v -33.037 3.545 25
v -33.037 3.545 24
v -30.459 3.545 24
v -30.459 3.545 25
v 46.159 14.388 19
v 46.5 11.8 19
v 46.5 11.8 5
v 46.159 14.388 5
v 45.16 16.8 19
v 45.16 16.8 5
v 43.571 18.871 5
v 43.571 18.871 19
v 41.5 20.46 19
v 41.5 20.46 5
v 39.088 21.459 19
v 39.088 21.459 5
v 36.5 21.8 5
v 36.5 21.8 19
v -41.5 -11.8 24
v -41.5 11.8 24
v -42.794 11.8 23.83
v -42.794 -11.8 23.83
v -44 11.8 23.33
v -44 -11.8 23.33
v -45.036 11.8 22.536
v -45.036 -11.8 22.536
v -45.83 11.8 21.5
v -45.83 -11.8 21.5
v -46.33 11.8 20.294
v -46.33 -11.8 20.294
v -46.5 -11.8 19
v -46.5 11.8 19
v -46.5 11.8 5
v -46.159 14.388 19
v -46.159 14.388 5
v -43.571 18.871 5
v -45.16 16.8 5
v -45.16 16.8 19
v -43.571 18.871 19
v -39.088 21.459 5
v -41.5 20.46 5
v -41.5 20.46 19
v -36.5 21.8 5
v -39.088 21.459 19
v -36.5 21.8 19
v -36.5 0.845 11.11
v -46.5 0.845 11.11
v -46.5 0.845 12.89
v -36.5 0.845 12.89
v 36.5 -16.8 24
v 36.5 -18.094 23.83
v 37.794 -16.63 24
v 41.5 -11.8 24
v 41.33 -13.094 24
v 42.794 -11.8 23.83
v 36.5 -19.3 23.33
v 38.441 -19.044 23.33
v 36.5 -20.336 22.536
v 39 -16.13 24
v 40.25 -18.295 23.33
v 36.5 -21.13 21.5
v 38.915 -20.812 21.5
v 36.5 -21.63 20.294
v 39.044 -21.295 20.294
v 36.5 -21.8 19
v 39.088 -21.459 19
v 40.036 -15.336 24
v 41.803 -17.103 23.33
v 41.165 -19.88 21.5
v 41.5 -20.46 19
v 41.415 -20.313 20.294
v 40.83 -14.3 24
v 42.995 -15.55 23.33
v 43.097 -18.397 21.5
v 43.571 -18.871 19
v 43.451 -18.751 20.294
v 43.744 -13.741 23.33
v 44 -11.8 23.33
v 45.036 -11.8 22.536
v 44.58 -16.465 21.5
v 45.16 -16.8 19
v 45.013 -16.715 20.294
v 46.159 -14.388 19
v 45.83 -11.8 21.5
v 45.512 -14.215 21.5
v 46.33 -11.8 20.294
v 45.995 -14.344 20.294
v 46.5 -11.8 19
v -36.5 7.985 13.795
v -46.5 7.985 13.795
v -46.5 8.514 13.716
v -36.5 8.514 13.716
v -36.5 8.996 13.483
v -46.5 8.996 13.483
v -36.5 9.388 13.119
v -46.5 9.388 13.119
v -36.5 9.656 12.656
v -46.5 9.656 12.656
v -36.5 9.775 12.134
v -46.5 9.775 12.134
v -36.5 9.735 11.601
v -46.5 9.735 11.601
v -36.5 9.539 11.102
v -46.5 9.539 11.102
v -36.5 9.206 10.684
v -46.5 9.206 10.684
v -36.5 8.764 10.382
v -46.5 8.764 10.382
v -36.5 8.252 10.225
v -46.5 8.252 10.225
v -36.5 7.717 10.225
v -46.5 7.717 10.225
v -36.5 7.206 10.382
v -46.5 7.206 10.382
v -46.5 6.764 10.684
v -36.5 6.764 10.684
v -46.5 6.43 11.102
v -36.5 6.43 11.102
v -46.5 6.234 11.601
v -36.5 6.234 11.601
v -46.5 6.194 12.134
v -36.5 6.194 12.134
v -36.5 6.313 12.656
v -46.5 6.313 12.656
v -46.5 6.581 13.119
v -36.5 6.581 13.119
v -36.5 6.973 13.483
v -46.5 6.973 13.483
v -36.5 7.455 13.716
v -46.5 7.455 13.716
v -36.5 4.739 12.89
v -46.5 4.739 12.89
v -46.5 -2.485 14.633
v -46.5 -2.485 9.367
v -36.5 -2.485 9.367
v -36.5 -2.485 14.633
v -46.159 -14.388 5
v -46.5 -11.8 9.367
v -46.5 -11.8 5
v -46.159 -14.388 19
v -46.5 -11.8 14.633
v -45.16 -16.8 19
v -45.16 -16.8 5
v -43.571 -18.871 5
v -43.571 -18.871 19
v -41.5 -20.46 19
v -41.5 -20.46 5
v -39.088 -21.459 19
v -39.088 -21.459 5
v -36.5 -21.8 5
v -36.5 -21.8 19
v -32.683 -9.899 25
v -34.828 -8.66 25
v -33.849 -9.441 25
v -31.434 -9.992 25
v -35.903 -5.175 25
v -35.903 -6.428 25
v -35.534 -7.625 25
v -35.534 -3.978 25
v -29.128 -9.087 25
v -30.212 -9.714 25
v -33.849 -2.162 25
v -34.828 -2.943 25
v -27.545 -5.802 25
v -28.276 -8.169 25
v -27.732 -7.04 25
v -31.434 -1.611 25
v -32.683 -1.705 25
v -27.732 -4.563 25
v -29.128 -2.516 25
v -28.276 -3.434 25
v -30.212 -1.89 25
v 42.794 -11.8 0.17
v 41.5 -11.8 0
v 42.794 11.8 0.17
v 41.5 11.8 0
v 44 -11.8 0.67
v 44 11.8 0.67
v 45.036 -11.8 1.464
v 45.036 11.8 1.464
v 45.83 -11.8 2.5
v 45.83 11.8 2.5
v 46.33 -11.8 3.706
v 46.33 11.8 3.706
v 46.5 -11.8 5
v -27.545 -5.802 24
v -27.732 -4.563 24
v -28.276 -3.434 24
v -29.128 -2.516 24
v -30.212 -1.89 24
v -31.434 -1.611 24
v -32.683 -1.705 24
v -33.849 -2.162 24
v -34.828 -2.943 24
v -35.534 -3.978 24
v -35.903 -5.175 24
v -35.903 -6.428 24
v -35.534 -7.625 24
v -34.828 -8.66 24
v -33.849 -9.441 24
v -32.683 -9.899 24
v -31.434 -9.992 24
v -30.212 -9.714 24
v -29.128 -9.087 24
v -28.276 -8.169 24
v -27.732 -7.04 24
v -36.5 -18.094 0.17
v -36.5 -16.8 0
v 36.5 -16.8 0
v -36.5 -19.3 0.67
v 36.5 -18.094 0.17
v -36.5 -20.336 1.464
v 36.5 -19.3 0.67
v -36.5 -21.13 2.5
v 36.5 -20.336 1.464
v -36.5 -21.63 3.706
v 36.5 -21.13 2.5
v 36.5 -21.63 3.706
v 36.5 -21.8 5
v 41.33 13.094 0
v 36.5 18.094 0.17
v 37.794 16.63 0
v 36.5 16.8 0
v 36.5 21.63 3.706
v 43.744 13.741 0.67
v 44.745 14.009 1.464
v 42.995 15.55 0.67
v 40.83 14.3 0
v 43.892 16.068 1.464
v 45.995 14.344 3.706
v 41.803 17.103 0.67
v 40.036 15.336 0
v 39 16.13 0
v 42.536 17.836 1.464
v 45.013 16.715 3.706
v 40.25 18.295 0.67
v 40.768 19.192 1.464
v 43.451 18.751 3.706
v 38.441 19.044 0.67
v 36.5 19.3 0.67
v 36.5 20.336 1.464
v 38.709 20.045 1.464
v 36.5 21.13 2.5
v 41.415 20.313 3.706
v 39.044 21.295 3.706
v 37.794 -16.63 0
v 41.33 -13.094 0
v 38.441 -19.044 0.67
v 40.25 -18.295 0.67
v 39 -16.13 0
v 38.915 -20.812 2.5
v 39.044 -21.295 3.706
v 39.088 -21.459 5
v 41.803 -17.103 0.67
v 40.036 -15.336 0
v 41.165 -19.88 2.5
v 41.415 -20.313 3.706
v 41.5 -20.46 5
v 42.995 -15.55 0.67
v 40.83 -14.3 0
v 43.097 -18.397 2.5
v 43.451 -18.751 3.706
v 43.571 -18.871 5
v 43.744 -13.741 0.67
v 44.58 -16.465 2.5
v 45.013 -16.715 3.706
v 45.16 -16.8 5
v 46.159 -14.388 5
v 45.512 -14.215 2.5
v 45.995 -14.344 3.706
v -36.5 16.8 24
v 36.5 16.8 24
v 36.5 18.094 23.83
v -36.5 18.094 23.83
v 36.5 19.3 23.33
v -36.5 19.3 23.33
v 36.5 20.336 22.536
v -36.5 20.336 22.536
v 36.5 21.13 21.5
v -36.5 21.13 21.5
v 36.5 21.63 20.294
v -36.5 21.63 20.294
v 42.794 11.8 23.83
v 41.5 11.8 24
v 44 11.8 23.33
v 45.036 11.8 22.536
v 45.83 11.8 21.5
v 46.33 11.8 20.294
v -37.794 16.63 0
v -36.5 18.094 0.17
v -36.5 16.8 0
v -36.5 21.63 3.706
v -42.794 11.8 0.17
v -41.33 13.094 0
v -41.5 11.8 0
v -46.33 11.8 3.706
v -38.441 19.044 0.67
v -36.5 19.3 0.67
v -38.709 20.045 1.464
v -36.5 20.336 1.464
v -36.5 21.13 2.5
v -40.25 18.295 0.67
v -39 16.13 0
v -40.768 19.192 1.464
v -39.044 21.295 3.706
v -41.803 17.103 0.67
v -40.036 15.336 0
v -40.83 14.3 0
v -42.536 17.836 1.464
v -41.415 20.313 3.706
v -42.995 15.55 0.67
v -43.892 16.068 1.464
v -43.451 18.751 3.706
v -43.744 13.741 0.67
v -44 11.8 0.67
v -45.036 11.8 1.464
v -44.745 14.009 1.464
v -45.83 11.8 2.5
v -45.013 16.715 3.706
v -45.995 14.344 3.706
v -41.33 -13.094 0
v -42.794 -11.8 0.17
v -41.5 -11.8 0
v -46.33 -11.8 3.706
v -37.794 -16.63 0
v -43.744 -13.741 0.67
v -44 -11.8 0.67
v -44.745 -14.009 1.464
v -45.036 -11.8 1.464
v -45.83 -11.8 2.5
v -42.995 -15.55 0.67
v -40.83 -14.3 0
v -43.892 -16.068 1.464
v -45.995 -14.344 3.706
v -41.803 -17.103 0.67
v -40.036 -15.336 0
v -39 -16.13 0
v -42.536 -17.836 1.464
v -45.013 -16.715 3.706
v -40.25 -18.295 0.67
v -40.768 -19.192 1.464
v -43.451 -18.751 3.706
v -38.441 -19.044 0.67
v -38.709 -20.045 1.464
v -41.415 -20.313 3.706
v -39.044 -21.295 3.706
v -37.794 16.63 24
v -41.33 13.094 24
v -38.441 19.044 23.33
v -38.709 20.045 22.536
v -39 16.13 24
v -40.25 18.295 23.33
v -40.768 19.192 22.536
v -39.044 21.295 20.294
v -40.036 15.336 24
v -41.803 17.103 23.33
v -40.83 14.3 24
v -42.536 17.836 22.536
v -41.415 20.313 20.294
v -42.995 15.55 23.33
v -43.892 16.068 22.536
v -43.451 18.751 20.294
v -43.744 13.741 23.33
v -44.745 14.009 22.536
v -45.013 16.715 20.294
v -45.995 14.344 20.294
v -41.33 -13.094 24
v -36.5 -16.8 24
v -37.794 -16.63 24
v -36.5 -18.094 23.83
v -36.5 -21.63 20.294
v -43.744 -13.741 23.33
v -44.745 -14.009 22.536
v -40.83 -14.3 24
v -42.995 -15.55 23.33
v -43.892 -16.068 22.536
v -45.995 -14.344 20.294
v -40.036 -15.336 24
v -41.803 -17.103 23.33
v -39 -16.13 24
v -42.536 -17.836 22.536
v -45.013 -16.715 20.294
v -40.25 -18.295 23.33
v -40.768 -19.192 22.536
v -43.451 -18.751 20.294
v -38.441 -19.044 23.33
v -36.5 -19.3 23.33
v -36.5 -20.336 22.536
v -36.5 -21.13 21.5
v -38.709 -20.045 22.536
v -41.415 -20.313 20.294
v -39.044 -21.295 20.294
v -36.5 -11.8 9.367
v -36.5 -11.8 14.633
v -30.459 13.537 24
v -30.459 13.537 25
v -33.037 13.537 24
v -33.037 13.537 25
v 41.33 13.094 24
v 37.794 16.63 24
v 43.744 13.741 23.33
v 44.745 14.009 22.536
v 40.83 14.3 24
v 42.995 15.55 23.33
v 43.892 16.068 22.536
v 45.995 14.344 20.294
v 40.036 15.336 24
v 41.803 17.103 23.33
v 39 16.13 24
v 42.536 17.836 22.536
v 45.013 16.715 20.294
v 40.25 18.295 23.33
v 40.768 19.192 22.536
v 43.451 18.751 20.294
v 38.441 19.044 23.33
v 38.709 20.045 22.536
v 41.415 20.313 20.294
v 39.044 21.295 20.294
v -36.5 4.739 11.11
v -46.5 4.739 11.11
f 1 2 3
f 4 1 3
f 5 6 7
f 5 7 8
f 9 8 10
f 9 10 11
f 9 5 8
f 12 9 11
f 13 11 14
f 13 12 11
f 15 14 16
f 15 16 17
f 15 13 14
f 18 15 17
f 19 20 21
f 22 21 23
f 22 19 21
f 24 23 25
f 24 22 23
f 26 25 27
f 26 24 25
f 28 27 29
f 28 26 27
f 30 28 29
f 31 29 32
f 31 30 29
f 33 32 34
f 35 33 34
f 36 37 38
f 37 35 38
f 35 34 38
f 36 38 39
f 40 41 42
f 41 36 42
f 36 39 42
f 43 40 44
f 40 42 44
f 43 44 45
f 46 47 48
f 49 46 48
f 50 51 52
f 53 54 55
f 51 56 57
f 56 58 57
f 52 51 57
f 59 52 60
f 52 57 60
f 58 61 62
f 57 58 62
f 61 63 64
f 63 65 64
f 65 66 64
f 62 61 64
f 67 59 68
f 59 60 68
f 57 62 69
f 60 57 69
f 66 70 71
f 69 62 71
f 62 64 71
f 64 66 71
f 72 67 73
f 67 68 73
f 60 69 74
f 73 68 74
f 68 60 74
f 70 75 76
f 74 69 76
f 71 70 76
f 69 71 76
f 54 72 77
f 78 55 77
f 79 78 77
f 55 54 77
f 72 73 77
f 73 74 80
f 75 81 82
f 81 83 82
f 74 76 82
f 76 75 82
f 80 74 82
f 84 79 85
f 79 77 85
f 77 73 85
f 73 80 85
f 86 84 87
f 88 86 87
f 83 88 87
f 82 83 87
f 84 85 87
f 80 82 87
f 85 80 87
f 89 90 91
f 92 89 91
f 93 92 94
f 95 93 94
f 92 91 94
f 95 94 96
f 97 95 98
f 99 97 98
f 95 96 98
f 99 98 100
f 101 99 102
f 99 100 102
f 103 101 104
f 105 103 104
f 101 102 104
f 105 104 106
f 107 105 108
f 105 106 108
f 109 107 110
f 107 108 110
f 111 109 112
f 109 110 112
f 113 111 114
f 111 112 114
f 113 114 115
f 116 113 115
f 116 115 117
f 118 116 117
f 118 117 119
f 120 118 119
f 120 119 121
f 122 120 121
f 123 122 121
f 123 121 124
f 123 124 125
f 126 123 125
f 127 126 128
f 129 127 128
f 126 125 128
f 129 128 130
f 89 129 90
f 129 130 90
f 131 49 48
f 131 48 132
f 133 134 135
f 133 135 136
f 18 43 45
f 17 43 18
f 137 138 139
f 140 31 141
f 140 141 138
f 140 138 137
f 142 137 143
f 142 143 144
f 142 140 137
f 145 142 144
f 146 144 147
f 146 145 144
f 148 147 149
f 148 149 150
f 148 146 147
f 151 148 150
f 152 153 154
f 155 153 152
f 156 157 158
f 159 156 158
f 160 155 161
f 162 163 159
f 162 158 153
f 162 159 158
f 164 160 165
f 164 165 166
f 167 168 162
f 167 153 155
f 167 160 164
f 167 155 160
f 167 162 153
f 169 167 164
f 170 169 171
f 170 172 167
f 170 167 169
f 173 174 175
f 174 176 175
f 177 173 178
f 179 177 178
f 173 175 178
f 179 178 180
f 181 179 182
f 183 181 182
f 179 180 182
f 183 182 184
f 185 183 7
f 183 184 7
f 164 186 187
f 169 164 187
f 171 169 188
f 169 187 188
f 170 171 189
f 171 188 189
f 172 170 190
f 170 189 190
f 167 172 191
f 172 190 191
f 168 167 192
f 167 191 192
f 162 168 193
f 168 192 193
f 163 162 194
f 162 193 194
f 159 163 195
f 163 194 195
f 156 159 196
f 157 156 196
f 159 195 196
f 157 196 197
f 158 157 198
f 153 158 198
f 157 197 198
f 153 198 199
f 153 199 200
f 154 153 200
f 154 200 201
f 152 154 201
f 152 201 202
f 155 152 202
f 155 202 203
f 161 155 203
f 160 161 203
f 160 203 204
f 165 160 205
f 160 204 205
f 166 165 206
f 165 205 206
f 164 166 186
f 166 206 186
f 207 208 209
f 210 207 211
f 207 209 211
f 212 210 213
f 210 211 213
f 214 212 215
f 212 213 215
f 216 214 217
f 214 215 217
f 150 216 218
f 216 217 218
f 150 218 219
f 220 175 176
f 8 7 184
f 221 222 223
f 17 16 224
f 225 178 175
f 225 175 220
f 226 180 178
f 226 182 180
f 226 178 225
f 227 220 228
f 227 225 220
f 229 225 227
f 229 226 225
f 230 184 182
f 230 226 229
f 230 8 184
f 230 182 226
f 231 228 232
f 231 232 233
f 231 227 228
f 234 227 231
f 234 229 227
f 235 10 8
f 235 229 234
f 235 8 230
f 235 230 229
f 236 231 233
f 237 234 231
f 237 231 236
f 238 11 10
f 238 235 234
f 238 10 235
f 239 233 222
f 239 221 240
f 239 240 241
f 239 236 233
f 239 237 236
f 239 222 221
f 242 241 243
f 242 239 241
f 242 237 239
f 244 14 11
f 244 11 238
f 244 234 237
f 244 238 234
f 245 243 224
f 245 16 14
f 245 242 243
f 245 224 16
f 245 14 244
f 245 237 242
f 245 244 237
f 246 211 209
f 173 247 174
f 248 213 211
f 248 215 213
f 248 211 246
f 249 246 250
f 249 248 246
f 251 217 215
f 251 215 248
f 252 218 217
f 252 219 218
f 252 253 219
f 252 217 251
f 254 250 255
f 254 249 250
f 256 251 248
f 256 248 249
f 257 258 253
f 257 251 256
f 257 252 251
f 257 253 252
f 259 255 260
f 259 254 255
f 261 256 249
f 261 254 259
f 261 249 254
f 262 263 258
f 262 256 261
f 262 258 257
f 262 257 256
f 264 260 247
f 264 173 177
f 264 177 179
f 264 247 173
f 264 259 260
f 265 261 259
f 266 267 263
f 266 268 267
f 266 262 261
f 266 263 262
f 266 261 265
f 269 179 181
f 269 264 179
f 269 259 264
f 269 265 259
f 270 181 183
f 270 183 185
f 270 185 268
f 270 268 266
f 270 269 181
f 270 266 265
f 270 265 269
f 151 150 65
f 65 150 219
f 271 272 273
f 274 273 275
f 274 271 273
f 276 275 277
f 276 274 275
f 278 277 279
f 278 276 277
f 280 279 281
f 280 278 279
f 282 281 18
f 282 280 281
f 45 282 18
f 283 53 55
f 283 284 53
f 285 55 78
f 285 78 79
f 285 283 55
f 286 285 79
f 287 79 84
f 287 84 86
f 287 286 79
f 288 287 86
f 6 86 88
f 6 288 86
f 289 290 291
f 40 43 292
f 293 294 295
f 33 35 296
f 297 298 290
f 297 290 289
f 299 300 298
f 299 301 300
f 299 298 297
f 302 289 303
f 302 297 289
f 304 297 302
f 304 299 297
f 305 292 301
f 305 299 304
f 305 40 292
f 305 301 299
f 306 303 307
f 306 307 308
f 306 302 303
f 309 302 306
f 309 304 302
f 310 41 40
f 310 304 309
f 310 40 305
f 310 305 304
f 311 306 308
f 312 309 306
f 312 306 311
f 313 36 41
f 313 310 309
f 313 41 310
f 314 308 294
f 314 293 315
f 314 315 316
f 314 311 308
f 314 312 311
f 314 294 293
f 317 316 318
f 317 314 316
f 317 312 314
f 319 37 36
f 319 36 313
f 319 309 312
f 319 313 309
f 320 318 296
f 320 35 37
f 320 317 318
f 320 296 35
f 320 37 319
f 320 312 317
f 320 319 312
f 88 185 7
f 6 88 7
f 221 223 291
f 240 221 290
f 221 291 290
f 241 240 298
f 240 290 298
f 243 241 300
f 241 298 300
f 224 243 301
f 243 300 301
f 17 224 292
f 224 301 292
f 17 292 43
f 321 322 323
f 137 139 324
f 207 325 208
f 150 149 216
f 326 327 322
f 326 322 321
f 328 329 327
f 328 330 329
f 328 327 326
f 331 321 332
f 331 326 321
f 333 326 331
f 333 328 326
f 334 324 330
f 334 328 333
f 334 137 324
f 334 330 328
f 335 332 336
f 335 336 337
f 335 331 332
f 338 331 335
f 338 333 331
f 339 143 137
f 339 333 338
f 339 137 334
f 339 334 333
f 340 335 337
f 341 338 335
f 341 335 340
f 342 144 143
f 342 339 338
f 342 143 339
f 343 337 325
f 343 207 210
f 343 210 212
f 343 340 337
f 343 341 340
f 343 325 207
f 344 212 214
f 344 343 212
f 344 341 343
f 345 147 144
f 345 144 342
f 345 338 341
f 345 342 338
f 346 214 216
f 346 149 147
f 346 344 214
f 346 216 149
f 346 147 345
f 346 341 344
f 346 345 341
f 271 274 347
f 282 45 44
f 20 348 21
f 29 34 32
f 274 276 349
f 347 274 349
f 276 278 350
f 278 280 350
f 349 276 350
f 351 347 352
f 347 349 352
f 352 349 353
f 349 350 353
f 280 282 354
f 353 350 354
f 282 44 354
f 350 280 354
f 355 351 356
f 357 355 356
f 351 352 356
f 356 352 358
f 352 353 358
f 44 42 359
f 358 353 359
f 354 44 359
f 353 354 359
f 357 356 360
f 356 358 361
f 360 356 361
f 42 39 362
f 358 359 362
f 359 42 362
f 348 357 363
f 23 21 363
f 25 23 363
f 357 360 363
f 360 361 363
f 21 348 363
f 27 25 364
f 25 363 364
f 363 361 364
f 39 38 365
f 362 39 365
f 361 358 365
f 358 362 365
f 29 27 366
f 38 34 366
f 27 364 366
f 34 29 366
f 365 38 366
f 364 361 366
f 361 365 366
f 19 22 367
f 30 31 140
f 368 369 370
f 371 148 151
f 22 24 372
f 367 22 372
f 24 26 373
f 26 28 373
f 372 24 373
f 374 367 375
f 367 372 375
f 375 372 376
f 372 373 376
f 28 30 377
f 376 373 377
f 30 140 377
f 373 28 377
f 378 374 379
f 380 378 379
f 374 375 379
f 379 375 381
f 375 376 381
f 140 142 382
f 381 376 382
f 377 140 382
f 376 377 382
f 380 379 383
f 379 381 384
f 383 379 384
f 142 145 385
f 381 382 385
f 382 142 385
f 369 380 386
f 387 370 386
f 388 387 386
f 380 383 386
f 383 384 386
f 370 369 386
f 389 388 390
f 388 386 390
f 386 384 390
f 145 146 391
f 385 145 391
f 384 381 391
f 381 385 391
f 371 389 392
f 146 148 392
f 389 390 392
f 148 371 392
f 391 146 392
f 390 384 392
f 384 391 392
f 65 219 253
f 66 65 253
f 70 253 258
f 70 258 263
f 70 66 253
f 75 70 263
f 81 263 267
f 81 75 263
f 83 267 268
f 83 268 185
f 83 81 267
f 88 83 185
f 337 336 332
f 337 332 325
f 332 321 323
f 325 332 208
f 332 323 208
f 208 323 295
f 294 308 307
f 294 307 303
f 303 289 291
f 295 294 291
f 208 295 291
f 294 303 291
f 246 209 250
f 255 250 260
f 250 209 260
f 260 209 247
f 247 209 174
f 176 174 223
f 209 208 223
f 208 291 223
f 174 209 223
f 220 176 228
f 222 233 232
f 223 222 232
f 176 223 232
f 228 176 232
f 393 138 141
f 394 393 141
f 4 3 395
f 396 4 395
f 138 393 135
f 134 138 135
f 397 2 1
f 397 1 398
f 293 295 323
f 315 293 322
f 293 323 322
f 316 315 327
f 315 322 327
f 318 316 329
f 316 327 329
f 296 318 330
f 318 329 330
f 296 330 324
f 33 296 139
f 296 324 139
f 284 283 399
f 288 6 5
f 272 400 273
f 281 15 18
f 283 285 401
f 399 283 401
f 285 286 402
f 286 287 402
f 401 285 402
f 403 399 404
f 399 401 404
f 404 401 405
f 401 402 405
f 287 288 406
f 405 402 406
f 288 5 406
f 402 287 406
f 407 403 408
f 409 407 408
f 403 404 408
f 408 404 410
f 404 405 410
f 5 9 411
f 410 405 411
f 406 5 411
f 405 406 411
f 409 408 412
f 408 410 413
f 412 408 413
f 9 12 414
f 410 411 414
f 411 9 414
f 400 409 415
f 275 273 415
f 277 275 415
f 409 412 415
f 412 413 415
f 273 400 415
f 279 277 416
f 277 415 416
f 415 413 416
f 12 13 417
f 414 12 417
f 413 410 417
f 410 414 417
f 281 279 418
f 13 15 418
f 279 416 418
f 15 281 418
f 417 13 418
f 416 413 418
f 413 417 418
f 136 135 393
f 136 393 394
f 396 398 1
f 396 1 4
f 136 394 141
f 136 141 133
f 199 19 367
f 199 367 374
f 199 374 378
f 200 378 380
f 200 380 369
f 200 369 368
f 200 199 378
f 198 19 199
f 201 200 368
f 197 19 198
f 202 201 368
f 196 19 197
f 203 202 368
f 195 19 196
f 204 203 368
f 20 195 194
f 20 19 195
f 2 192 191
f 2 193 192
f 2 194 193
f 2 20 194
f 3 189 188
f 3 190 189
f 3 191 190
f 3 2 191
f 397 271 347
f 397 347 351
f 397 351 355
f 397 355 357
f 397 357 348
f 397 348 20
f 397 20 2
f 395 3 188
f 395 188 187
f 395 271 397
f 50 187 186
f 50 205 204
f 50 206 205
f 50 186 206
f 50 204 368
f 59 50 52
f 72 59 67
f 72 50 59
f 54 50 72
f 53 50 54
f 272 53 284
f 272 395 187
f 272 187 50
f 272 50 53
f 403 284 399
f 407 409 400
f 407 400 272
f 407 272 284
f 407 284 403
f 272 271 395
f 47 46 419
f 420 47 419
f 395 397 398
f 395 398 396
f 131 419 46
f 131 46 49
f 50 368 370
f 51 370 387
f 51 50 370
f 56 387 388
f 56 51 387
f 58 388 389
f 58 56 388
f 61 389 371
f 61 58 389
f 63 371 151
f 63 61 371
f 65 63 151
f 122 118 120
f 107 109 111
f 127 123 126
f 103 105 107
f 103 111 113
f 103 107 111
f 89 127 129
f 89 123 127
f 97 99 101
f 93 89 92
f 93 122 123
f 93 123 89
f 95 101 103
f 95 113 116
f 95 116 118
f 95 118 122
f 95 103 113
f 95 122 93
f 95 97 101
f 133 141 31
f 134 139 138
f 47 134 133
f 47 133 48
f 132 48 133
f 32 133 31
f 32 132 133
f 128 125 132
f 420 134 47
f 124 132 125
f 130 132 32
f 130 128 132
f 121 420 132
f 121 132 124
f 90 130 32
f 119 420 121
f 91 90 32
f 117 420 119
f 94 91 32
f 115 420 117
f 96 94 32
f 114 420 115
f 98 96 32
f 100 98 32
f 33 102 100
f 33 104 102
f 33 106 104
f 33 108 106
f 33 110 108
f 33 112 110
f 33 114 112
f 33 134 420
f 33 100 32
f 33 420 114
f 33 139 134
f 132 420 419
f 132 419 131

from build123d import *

# Parameters (mm, degrees)
CROQUIS1_W              = 93
CROQUIS1_H              = 43.6
SALIENTE_EXTRUIR1_DEPTH = 24
REDONDEO1_R             = 10
REDONDEO2_R             = 5
CROQUIS2_R              = 1.795301333
CROQUIS2_W              = 5.26615661
CROQUIS2_H              = 9.314898328
CROQUIS2_W_2            = 1.780690374
CROQUIS2_H_2            = 3.893669573
CORTAR_EXTRUIR1_DEPTH   = 10
CROQUIS4_R              = 4.202442578
CROQUIS4_W              = 2.57850106
CROQUIS4_H              = 9.991691608
SALIENTE_EXTRUIR2_DEPTH = 1


with BuildPart() as part:
    # Croquis1 → Saliente-Extruir1 (new body)
    with BuildSketch(Plane.XY):
        Rectangle(CROQUIS1_W, CROQUIS1_H)
    extrude(amount=SALIENTE_EXTRUIR1_DEPTH)

    # Redondeo1
    redondeo1_edges = [part.edges().sort_by_distance(p)[0] for p in [
        (46.5, -21.8, 12),
        (-46.5, -21.8, 12),
        (-46.5, 21.8, 12),
        (46.5, 21.8, 12),
    ]]
    fillet(redondeo1_edges, radius=REDONDEO1_R)

    # Redondeo2
    redondeo2_edges = [part.edges().sort_by_distance(p)[0] for p in [
        (46.5, 0, 0),
        (46.5, 0, 24),
        (0, -21.8, 0),
        (-46.5, 0, 0),
        (0, 21.8, 0),
        (-43.571067812, 18.871067812, 0),
        (-43.571067812, -18.871067812, 0),
        (43.571067812, 18.871067812, 0),
        (43.571067812, -18.871067812, 0),
        (0, -21.8, 24),
        (0, 21.8, 24),
        (-46.5, 0, 24),
        (-43.571067812, 18.871067812, 24),
        (-43.571067812, -18.871067812, 24),
        (43.571067812, 18.871067812, 24),
        (43.571067812, -18.871067812, 24),
    ]]
    fillet(redondeo2_edges, radius=REDONDEO2_R)

    # Croquis2 → Cortar-Extruir1 (cut)
    with BuildSketch(Plane.ZY.offset(46.5)):
        with Locations((12, 7.984643734)):
            Circle(CROQUIS2_R)
        with Locations((12, -7.142550836)):
            Rectangle(CROQUIS2_W, CROQUIS2_H)
        with Locations((12, 2.792227185)):
            Rectangle(CROQUIS2_W_2, CROQUIS2_H_2)
    extrude(amount=-CORTAR_EXTRUIR1_DEPTH, mode=Mode.SUBTRACT)

    # Croquis4 → Saliente-Extruir2 (add)
    with BuildSketch(Plane.XY.offset(24)):
        with Locations((-31.747794301, -5.801627385)):
            Circle(CROQUIS4_R)
        with Locations((-31.747794301, 8.541284761)):
            Rectangle(CROQUIS4_W, CROQUIS4_H)
    extrude(amount=SALIENTE_EXTRUIR2_DEPTH)


solid = part.part
